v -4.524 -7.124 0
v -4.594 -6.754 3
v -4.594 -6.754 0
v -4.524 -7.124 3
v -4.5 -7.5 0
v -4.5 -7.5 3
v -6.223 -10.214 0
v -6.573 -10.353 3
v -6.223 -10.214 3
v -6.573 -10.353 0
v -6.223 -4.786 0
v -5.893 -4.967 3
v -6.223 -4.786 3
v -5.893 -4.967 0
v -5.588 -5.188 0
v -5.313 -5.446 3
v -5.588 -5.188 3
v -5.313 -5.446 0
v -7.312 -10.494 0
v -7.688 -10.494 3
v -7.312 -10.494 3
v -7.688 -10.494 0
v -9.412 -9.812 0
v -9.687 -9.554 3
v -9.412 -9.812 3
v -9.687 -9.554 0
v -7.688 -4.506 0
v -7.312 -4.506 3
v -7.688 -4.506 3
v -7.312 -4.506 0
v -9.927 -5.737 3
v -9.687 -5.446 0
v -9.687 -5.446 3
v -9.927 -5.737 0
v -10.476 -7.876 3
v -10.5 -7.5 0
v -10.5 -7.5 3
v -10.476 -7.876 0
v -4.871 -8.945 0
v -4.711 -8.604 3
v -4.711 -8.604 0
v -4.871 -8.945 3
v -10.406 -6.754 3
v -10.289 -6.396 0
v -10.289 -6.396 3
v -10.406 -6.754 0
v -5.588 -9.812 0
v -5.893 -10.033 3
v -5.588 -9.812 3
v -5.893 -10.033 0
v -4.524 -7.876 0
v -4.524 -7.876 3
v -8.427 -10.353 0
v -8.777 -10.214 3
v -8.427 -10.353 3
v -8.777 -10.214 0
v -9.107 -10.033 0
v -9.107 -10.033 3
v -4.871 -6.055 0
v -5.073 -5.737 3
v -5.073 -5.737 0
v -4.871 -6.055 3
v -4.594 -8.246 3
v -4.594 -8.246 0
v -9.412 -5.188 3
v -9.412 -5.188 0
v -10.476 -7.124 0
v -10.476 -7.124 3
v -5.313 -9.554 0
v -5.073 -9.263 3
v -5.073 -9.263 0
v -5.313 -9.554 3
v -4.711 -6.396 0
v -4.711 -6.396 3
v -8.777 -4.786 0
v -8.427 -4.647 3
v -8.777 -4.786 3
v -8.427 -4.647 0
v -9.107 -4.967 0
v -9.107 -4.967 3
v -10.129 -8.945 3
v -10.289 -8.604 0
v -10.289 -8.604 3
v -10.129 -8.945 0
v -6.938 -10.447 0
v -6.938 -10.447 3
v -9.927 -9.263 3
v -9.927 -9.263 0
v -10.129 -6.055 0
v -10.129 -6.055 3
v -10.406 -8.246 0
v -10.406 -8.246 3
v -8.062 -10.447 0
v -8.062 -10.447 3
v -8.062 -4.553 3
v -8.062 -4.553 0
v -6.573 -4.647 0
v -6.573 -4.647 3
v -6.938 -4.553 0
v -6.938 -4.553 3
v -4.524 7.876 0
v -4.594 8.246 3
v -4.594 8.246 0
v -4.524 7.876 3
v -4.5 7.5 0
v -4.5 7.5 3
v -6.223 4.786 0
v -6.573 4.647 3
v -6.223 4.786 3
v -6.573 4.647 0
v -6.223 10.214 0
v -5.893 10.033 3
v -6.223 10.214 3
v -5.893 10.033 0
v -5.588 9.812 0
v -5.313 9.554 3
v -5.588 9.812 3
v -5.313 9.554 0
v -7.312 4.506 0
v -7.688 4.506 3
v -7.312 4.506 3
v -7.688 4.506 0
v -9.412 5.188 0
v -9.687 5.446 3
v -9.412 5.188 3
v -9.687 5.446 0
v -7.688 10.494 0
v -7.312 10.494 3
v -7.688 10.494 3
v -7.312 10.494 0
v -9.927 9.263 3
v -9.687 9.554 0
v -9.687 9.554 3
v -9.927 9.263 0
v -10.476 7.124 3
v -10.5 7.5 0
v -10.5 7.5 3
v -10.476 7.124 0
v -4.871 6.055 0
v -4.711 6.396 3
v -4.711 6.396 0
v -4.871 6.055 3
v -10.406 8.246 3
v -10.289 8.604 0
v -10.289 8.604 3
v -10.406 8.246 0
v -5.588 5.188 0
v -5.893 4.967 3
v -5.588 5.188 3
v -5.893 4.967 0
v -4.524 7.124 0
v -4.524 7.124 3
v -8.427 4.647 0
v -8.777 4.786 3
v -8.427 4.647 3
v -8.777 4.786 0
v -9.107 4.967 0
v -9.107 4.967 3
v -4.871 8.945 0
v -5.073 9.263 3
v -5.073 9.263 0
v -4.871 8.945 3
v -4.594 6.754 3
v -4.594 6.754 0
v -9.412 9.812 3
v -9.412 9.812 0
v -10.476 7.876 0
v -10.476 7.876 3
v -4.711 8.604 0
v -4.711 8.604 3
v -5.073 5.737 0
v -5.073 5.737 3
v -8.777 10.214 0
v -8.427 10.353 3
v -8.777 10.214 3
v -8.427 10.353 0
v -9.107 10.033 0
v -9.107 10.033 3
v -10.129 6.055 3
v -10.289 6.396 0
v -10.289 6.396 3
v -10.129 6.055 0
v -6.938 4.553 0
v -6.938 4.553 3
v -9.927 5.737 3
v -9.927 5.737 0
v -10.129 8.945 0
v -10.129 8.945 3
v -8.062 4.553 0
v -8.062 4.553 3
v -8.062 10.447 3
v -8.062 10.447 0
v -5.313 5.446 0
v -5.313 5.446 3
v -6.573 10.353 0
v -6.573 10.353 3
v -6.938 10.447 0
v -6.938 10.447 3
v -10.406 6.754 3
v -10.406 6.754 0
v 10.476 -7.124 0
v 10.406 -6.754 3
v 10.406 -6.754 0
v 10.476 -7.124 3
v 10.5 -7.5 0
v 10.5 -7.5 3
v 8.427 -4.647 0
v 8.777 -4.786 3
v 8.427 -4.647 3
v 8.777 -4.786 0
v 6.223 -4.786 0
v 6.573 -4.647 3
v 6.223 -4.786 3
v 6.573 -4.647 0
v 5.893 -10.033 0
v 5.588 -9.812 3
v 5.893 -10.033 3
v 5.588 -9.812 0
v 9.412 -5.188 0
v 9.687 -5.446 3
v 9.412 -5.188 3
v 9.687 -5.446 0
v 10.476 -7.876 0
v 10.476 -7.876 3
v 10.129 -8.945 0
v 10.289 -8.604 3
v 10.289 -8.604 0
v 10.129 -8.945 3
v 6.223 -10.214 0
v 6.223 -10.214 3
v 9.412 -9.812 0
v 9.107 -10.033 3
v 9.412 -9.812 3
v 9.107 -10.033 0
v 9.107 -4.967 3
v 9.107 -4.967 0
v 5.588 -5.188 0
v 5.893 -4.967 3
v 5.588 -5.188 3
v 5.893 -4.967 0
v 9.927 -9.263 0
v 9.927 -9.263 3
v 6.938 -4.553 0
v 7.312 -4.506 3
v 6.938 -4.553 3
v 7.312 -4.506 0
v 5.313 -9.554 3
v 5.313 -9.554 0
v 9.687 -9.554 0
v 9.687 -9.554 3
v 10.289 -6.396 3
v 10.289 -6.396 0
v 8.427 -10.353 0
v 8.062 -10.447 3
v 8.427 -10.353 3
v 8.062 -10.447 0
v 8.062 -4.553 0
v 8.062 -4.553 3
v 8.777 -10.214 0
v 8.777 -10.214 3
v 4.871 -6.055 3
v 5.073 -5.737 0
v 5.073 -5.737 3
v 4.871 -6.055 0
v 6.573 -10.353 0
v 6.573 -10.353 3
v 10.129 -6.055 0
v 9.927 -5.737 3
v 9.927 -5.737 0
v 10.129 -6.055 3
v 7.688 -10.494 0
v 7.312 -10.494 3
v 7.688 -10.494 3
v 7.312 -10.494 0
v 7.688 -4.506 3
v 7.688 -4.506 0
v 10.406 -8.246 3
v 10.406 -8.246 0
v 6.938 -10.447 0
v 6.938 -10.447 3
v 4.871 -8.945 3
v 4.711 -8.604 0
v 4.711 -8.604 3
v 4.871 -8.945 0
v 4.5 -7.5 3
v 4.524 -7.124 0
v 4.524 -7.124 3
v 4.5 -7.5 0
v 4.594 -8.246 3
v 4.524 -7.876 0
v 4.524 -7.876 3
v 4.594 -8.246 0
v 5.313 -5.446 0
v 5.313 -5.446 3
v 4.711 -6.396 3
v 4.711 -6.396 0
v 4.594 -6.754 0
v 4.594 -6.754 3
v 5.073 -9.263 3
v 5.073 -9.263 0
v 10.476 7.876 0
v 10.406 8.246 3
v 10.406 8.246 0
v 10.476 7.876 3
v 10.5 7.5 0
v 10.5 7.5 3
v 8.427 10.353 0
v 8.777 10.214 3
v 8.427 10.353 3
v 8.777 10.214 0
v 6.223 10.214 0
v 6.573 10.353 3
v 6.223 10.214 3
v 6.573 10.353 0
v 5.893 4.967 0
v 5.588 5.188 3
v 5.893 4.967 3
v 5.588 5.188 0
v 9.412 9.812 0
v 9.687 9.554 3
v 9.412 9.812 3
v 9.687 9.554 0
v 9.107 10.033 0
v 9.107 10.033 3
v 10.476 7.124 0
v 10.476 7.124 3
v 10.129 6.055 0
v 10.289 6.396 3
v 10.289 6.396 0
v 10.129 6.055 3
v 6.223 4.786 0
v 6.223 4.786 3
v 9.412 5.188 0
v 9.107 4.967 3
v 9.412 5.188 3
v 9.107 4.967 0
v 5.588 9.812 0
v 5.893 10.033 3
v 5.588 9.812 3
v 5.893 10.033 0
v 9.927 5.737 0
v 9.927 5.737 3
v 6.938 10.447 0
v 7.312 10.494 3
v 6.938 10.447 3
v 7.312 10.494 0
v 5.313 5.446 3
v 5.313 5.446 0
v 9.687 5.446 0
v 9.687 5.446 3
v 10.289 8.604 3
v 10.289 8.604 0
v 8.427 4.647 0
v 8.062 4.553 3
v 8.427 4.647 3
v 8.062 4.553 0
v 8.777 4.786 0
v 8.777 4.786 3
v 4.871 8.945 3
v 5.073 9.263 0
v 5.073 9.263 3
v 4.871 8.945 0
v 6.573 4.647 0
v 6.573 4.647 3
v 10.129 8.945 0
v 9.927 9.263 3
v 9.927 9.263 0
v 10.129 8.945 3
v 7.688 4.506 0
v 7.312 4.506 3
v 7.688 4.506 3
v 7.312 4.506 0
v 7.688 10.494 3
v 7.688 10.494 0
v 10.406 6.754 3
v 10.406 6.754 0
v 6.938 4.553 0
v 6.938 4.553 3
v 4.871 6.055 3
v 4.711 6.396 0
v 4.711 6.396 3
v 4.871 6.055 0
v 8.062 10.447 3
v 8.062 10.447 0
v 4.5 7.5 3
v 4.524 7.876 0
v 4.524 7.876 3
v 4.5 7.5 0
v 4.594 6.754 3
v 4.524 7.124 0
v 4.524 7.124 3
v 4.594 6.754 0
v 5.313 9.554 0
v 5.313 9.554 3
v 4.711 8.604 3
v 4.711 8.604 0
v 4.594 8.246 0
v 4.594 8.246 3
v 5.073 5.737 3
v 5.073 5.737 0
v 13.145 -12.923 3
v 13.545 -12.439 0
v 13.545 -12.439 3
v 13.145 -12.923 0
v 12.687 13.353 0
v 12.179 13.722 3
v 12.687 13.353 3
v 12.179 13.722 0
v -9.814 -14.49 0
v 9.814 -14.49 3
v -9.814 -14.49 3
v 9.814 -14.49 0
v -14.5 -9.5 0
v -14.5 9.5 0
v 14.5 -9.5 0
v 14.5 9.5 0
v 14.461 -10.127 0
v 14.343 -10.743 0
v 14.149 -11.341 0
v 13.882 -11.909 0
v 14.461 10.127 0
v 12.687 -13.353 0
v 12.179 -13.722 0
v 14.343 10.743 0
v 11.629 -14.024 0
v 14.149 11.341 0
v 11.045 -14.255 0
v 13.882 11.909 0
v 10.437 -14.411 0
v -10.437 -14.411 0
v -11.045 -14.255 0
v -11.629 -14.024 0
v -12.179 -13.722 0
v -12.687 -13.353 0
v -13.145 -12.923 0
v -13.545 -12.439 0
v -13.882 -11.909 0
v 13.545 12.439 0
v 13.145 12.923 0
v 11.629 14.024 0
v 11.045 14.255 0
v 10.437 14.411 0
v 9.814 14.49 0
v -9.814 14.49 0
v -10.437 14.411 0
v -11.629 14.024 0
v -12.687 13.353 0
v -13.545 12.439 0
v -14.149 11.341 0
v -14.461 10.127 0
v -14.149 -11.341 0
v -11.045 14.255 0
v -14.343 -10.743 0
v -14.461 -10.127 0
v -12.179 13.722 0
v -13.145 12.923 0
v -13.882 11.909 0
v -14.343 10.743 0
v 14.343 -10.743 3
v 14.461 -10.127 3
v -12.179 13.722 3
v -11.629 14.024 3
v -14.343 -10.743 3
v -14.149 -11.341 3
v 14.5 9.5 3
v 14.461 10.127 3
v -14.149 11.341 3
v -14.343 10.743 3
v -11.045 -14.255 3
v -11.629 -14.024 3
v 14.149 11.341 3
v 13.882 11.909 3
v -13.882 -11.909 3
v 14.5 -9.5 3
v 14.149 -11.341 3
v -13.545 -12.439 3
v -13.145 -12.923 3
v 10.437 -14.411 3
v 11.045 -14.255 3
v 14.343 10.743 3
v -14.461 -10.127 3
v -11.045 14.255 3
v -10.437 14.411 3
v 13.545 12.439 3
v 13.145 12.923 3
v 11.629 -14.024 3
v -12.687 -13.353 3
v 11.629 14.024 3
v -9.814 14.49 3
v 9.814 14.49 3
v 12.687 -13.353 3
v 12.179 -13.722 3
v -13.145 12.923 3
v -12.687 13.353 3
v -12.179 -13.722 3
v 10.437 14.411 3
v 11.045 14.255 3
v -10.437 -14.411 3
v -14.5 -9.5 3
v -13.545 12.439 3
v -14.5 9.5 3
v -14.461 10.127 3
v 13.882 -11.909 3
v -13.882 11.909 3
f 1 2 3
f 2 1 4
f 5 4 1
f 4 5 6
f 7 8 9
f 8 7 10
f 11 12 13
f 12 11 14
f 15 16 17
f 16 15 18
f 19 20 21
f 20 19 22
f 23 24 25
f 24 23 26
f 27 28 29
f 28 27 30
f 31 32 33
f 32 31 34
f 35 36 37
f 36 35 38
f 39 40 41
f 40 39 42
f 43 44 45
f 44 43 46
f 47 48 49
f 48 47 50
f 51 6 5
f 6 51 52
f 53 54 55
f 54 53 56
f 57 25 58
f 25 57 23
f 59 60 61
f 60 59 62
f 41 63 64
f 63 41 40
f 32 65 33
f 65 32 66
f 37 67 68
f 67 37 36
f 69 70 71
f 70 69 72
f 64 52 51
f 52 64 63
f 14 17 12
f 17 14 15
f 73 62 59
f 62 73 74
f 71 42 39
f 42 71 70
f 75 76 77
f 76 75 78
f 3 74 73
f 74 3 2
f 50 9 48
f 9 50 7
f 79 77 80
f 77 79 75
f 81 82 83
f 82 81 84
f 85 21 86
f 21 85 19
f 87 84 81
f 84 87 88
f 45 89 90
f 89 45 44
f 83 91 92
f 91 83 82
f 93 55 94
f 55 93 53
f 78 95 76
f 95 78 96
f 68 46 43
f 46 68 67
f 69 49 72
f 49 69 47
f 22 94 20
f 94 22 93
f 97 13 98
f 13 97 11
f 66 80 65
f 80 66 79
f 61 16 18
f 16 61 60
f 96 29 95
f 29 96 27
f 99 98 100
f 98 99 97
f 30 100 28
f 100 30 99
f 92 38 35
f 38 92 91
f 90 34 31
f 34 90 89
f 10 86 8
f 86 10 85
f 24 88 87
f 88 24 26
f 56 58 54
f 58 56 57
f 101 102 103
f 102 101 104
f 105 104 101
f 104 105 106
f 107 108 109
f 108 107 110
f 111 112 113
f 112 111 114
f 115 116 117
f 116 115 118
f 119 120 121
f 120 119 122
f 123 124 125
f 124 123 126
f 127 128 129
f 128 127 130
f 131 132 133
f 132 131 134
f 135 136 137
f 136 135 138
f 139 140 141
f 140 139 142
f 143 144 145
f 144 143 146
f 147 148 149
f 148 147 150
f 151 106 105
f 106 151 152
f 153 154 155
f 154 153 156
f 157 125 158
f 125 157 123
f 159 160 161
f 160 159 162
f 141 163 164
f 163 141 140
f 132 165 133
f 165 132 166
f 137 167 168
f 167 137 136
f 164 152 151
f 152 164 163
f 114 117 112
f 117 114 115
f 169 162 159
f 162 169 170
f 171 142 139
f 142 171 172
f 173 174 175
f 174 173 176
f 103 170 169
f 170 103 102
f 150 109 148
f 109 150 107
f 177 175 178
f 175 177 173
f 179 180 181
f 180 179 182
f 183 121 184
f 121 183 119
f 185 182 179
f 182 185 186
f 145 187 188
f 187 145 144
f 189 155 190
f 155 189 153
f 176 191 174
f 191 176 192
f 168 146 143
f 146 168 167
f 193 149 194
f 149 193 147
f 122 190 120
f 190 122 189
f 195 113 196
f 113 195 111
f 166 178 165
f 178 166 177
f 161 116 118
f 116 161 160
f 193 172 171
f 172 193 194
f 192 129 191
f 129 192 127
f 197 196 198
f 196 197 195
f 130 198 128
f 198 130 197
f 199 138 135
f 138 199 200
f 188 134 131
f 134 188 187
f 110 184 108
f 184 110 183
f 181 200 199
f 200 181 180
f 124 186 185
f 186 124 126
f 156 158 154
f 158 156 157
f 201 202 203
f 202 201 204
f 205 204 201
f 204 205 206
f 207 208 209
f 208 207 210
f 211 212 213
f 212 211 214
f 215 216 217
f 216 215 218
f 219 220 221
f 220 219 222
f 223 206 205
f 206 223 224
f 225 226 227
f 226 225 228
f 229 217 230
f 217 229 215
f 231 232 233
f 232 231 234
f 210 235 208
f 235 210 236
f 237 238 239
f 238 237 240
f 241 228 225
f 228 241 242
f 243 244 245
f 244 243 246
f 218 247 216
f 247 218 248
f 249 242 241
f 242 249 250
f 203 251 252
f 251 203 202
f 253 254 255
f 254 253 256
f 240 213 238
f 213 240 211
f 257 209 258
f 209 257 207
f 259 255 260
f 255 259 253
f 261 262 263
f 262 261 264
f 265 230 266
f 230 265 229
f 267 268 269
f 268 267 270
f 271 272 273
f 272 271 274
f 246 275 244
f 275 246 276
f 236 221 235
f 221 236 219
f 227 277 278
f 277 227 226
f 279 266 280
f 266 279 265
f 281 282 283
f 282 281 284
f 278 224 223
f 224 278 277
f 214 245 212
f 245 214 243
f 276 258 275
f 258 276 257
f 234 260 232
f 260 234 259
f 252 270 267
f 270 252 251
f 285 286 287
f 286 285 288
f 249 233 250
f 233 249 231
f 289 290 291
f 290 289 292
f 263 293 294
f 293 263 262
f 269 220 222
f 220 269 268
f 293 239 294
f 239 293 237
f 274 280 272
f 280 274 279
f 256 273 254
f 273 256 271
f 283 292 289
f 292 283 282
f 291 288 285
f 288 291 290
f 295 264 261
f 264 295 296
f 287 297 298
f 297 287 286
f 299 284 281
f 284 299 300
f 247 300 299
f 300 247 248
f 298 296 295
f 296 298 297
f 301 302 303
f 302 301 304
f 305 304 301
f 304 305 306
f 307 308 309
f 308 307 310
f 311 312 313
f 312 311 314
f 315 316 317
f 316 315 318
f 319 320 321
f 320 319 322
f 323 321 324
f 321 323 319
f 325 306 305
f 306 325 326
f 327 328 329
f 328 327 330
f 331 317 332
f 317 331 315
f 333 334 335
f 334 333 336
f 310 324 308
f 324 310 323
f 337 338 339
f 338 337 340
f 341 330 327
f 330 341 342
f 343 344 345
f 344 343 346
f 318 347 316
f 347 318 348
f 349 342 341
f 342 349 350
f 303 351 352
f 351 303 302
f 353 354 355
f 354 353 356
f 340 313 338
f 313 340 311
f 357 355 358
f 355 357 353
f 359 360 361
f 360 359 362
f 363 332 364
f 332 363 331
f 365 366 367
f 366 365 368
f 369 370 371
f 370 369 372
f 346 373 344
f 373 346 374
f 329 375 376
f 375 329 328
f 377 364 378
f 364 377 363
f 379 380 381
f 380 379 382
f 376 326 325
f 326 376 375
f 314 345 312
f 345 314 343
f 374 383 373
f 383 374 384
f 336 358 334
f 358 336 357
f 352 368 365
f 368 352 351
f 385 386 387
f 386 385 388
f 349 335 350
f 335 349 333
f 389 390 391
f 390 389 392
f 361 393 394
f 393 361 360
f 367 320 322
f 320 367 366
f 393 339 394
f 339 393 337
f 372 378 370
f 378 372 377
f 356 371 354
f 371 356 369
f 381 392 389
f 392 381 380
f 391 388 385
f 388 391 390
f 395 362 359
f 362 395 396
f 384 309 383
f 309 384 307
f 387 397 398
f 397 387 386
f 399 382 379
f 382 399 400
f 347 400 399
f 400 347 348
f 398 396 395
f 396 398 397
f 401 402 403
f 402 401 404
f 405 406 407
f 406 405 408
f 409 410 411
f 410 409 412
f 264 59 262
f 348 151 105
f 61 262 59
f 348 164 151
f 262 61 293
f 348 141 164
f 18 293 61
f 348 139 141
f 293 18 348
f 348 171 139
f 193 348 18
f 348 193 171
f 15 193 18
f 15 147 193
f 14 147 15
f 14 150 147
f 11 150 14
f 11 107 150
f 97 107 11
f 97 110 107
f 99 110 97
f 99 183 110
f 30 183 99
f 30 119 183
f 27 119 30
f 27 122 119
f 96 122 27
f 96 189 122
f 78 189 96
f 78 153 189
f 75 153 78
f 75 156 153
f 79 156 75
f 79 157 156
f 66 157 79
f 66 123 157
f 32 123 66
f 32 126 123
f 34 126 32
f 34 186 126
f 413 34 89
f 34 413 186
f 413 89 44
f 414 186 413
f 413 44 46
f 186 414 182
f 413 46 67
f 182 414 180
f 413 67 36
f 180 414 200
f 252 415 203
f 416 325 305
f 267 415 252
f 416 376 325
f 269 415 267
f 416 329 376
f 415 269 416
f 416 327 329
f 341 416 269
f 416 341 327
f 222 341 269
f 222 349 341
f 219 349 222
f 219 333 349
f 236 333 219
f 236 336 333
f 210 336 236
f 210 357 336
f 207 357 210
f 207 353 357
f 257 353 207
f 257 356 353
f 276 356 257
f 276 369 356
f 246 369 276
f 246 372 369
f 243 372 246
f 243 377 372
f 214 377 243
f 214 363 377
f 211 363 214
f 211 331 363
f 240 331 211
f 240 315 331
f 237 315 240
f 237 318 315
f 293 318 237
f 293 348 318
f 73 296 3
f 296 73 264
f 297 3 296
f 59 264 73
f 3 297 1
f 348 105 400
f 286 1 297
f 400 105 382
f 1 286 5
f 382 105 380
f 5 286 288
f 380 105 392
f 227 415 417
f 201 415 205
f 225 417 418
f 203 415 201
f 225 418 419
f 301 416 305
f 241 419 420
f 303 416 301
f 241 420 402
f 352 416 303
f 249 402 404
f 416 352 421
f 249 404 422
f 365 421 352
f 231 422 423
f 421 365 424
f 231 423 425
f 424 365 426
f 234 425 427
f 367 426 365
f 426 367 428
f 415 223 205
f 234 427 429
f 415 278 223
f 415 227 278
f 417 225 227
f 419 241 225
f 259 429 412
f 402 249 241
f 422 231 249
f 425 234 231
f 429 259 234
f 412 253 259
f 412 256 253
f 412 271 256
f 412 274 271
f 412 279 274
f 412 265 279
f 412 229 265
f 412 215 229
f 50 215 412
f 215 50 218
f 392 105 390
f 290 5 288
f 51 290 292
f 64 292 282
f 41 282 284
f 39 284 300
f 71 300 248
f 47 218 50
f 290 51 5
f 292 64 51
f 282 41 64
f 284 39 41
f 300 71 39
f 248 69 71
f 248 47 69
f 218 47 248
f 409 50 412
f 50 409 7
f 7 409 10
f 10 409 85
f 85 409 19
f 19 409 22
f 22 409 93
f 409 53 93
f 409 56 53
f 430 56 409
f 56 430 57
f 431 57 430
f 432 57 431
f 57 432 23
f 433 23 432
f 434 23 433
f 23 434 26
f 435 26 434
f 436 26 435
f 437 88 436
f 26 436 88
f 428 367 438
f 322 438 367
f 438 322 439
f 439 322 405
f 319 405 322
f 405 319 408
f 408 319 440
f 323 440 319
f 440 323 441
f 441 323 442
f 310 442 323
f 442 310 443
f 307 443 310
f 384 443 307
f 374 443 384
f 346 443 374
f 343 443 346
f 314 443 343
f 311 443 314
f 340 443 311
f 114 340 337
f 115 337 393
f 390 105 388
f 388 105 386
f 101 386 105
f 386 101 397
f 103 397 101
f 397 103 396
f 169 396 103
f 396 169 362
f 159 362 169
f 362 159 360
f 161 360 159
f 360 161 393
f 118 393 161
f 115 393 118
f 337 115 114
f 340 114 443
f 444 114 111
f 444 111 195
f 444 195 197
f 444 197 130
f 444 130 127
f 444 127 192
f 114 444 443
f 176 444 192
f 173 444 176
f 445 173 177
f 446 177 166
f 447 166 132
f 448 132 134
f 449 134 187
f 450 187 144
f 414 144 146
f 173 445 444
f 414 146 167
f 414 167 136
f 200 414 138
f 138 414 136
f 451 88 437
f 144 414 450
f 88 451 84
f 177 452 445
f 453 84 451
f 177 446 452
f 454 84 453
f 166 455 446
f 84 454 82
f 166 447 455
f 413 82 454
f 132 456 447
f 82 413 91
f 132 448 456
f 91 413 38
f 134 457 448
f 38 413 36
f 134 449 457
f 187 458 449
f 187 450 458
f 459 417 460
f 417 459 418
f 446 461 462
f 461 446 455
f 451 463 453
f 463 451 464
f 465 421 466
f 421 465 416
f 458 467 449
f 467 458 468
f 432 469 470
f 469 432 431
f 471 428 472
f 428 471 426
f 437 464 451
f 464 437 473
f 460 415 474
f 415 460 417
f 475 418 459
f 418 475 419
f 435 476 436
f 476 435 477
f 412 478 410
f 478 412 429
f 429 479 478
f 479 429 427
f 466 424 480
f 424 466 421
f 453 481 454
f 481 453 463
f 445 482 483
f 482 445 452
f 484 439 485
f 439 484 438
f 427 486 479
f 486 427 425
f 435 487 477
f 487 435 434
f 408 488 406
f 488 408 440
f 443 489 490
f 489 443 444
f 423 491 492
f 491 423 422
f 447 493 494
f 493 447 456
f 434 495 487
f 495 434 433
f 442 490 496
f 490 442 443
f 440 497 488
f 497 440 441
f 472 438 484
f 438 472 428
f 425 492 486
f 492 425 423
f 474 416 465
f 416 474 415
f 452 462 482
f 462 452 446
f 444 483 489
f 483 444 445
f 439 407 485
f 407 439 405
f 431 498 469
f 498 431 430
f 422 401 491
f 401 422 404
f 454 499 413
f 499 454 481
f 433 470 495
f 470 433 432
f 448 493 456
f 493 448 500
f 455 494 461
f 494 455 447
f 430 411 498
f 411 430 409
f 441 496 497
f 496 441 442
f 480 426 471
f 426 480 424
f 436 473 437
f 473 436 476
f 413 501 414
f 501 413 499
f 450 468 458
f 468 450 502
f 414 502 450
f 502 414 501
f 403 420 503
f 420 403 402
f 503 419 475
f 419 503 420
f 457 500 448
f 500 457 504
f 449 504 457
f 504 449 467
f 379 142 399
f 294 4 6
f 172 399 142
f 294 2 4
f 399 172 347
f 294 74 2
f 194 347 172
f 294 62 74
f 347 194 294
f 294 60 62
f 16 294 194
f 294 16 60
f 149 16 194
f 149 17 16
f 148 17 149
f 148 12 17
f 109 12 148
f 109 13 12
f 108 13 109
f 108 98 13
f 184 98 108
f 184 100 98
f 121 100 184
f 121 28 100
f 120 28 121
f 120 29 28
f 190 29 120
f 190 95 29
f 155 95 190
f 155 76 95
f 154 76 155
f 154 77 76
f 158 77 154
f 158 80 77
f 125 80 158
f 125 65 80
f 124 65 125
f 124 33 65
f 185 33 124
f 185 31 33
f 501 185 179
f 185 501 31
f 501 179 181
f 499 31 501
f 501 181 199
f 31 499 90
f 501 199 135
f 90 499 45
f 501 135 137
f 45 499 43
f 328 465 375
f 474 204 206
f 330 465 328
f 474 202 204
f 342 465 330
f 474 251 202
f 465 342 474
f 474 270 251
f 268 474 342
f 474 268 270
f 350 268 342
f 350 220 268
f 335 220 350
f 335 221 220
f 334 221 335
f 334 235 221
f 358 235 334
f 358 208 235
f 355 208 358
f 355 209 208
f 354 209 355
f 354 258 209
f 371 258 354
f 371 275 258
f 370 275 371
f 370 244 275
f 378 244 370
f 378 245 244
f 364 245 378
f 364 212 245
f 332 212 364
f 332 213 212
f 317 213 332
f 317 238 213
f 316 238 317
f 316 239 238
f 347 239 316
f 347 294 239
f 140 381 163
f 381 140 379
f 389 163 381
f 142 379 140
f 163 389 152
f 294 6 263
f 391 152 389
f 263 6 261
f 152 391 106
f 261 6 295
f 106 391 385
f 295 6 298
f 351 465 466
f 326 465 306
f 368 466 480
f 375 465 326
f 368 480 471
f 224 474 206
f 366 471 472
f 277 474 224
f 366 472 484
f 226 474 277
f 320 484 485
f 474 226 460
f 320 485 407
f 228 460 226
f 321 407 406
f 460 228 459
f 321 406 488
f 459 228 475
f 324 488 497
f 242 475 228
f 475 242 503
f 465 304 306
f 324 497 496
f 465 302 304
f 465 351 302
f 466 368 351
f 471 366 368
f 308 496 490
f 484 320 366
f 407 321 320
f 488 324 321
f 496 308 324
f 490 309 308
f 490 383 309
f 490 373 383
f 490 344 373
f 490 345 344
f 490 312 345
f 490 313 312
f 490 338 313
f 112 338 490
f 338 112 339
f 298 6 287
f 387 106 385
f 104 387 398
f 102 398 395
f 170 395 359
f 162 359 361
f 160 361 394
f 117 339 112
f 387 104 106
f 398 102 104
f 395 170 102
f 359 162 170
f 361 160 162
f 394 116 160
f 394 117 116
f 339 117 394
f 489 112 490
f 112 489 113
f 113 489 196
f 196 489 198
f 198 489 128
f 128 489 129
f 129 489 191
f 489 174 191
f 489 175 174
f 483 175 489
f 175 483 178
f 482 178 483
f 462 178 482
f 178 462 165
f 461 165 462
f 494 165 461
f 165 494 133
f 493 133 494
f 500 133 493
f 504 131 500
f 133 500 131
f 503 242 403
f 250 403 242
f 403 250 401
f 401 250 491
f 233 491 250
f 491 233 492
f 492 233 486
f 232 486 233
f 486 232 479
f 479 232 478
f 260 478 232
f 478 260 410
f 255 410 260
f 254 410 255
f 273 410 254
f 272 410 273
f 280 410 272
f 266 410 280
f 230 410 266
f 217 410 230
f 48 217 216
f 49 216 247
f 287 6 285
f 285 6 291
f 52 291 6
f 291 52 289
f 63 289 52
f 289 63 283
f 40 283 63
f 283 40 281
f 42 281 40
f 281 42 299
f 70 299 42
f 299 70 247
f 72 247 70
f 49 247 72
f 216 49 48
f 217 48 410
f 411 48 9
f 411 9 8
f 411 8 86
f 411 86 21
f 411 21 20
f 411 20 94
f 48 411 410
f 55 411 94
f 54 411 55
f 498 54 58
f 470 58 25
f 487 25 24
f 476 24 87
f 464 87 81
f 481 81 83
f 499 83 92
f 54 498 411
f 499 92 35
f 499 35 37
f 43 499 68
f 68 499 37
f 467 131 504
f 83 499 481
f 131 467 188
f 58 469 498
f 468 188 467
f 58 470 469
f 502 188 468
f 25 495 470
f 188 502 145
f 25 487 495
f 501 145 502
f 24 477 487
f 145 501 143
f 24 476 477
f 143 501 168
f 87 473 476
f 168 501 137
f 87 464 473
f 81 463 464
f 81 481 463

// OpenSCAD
// Generated by SolidPython 1.1.3 on 2023-03-12 21:51:15
$fn = 50;


difference() {
	union() {
		translate(v = [0, 0, 0]) {
			rotate(a = [0, 0, 0]) {
				hull() {
					translate(v = [-9.5000000000, 9.5000000000, 0]) {
						rotate(a = [0, 0, 0]) {
							translate(v = [0, 0, 0]) {
								rotate(a = [0, 0, 0]) {
									cylinder(h = 3, r = 5);
								}
							}
						}
					}
					translate(v = [9.5000000000, 9.5000000000, 0]) {
						rotate(a = [0, 0, 0]) {
							translate(v = [0, 0, 0]) {
								rotate(a = [0, 0, 0]) {
									cylinder(h = 3, r = 5);
								}
							}
						}
					}
					translate(v = [-9.5000000000, -9.5000000000, 0]) {
						rotate(a = [0, 0, 0]) {
							translate(v = [0, 0, 0]) {
								rotate(a = [0, 0, 0]) {
									cylinder(h = 3, r = 5);
								}
							}
						}
					}
					translate(v = [9.5000000000, -9.5000000000, 0]) {
						rotate(a = [0, 0, 0]) {
							translate(v = [0, 0, 0]) {
								rotate(a = [0, 0, 0]) {
									cylinder(h = 3, r = 5);
								}
							}
						}
					}
				}
			}
		}
	}
	union() {
		translate(v = [-7.5000000000, -7.5000000000, 0]) {
			rotate(a = [0, 0, 0]) {
				translate(v = [0, 0, -50]) {
					rotate(a = [0, 0, 0]) {
						cylinder(h = 100, r = 3.0000000000);
					}
				}
			}
		}
		translate(v = [-7.5000000000, 7.5000000000, 0]) {
			rotate(a = [0, 0, 0]) {
				translate(v = [0, 0, -50]) {
					rotate(a = [0, 0, 0]) {
						cylinder(h = 100, r = 3.0000000000);
					}
				}
			}
		}
		translate(v = [7.5000000000, -7.5000000000, 0]) {
			rotate(a = [0, 0, 0]) {
				translate(v = [0, 0, -50]) {
					rotate(a = [0, 0, 0]) {
						cylinder(h = 100, r = 3.0000000000);
					}
				}
			}
		}
		translate(v = [7.5000000000, 7.5000000000, 0]) {
			rotate(a = [0, 0, 0]) {
				translate(v = [0, 0, -50]) {
					rotate(a = [0, 0, 0]) {
						cylinder(h = 100, r = 3.0000000000);
					}
				}
			}
		}
	}
}
/***********************************************
*********      SolidPython code:      **********
************************************************
 
from solid import *
import os
import subprocess

import oomB

import opsc_library_gen

mode = "laser"
#mode = "3d_print"

defined_objects = {}

radius_dict = {}
countersunk_dict = {}


def set_mode(m):
    global mode
    mode = m
    radius_dict['M6'] = 6.5/2
    radius_dict['M3'] = 3.3/2
    if mode == "laser":
        radius_dict['M6'] = 6/2
        radius_dict['M3'] = 3/2

    countersunk_dict['M3'] = {}
    countersunk_dict['M3']['little_rad'] = radius_dict['M3']
    countersunk_dict['M3']['big_rad'] = (5.5+0.6)/2
    if mode == "laser":
        countersunk_dict['M3']['big_rad'] = (4.75+0.6)/2
        countersunk_dict['M3']['little_rad'] = (4.75+0.6)/2

    countersunk_dict['M3']['height'] = 1.7


def opsc_make_object(filename, objects, save_type="none",resolution=50, layers = 1, tilediff = 200, mode="laser", overwrite=True):
    if overwrite or not os.path.exists(filename):
        set_mode(mode)
        save_type = save_type.lower()
        os.makedirs(os.path.dirname(filename), exist_ok=True)
        final_object = opsc_get_object(objects, mode = mode)
        # Save the final object to the specified filename    
        scad_render_to_file(final_object, filename, file_header='$fn = %s;' % resolution, include_orig_code=True)
        if mode == "laser":
            filename_laser = filename.replace(".scad","-flat.scad")
            scad_render_to_file(getLaser(final_object, layers=layers, tilediff=tilediff), filename_laser, file_header='$fn = %s;' % resolution, include_orig_code=True)
            if save_type == "all":
                saveToAll(filename_laser)
            elif save_type == "dxf":
                saveToDxf(filename_laser)
        if save_type == "all":
            saveToAll(filename)
        elif save_type == "dxf":
            saveToDxf(filename)


def opsc_get_object(objects, mode = "laser"):
    # Create the solidpython objects only include the positive objects and if they don't have inclusion or their inclusion is either all or mode
    # Initialize an empty list to store the results
    positive_objects = []

    # Iterate over the "objects" list
    for obj in objects:
        # Check if the current object has a "type" key with a value of "positive"
        if obj['type'] == 'positive':
            # Check if the current object has an "inclusion" key and its value matches "mode",
            # or if the current object does not have an "inclusion" key at all
            if not 'inclusion' in obj or obj['inclusion'] == "all" or obj['inclusion'] == mode:
                # Call the "get_opsc_item" function with the current object as an argument
                opsc_item = get_opsc_item(obj)
                # Add the result to the "positive_objects" list
                positive_objects.append(opsc_item)
# Initialize an empty list to store the results
    negative_objects = []

    # Iterate over the "objects" list
    for obj in objects:
        # Check if the current object has a "type" key with a value of "negative"
        if obj['type'] == 'negative':
            # Check if the current object has an "inclusion" key and its value matches "mode",
            # or if the current object does not have an "inclusion" key at all
            if not 'inclusion' in obj or obj['inclusion'] == "all" or obj['inclusion'] == mode:
                # Call the "get_opsc_item" function with the current object as an argument
                opsc_item = get_opsc_item(obj)
                # Add the result to the "negative_objects" list
                negative_objects.append(opsc_item)
    
    #positive_objects = [get_opsc_item(obj) for obj in objects if obj['type'] == 'positive']
    #negative_objects = [get_opsc_item(obj) for obj in objects if obj['type'] == 'negative']
    # Union the positive objects
    positive_object = union()(*positive_objects)
    # Union the negative objects
    negative_object = union()(*negative_objects)
    # Create the final object by subtracting the negative objects from the positive objects
    return difference()(positive_object, negative_object)

def get_opsc_item(params):
    # A dictionary to map radius string values to numerical values
    #radius_dict = {'small': 5, 'medium': 10, 'large': 15}
    # An array of function names for basic shapes
    basic_shapes = ['cube', 'sphere', 'cylinder']
    
    # An array of function names for other shapes
    other_shapes = ['hole', 'slot', 'rounded_rectangle', 'countersunk']
    


    # Convert radius to r if present, and remove radius from the params dictionary
    if 'radius' in params:
        if isinstance(params['radius'], str):
            # Use the radius_dict to map the radius string value to a numerical value
            params['r'] = radius_dict[params['radius']]
        else:
            params['r'] = params['radius']
        del params['radius']
    

    # Check if the object type is a basic shape
    if params['shape'] in basic_shapes:
        # Remove shape and unexpected dictionary values
        allowed_keys = {'size', 'r', 'r1', 'r2', 'd', 'h', 'rw', 'rh', 'dw', 'dh'}
        shape_params = {k: v for k, v in params.items() if k in allowed_keys}

        # Call the corresponding function for the shape parameter, using ** notation to pass the shape_params dictionary as keyword arguments
        return get_opsc_transform(params,globals()[params['shape']](**shape_params))
    
    # If the object type is not a basic shape, check if it's a defined object or one of the other shapes
    elif params['shape'] in other_shapes:
        # Call the corresponding function for the shape parameter, passing the params dictionary as an argument
        p2 = copy.deepcopy(params)
        p2["pos"] = [0,0,0]
        return get_opsc_transform(params,globals()[params['shape']](p2))
    
    # If the object is not a basic shape or a defined object, try to import it from a .scad file
    else:
        obj = defined_objects[params['shape']]
        return get_opsc_transform(params,obj)

def get_opsc_transform(params, solid_obj):
    # Rotate the object based on the 'rot' field in the params dictionary, or the 'rotX', 'rotY', and 'rotZ' fields if 'rot' is not present
    rot = params.get('rot', [])
    if rot:
        rotX, rotY, rotZ = rot
    else:
        rotX = params.get('rotX', 0)
        rotY = params.get('rotY', 0)
        rotZ = params.get('rotZ', 0)
    solid_obj = rotate([rotX, rotY, rotZ])(solid_obj)

    # Translate the object based on the 'pos' field in the params dictionary, or the 'x', 'y', and 'z' fields if 'pos' is not present
    pos = params.get('pos', [])
    if pos:
        x, y, z = pos
    else:
        x = params.get('x', 0)
        y = params.get('y', 0)
        z = params.get('z', 0)
    solid_obj = translate([x, y, z])(solid_obj)
    return solid_obj


import random

def opsc_easy_array(type, shape, repeats, pos_start, shift_arr, **kwargs):
    for i in range(0,3):
        repeats.append(1)
        pos_start.append(0)
        shift_arr.append(0)
    return_objects = []

    for x in range(0,repeats[0]):
        for y in range(0,repeats[1]):
            for z in range(0,repeats[2]):
                return_objects.append(opsc_easy(type, shape, pos=[pos_start[0]+x*shift_arr[0],pos_start[1]+y*shift_arr[1],pos_start[2]+z*shift_arr[2]], **kwargs))
    return return_objects                



def opsc_easy(type, shape, **kwargs):
    obj = {
        'type': type,
        'shape': shape
    }
    for param in ['size', 'r', 'r1', 'r2', 'd', 'h', 'rw', 'rh', 'dw', 'dh', 'pos', 'x', 'y', 'z', 'rot', 'rotX', 'rotY', 'rotZ', "w", "inclusion"]:
        if param in kwargs:
            obj[param] = kwargs[param]
    return obj

def hole(params):
    p2 = copy.deepcopy(params)  
    # Check if the radius is a string and replace it with the corresponding value from the dictionary
    if isinstance(p2['r'], str):
        p2['r'] = radius_dict[p2['r']]
    
    # Set the height to 100 if not specified
    if 'h' not in p2:
        p2['h'] = 100
        p2["pos"] = [0,0,-50]
    p2["center"] = True
    # Create the cylinder object
    p2["shape"] = "cylinder"
    p2["type"] = "positive"

    return get_opsc_item(p2)

import copy

def countersunk(params):
    p2 = copy.deepcopy(params)
    counter_rad = p2['r']
    p2['r'] = radius_dict[p2['r']]
    hp = copy.deepcopy(p2)
    hp["type"] = "positive"
    hp["shape"] = "hole"
    del hp["rot"]
    hol = get_opsc_item(hp)
    
    cp = copy.deepcopy(p2)
    cp["h"] = countersunk_dict[counter_rad]["height"]
    cp["r2"] = countersunk_dict[counter_rad]["little_rad"]
    cp["r1"] = countersunk_dict[counter_rad]["big_rad"]
    del cp["r"]
    del cp["rot"]
    cp["type"] = "positive"
    cp["shape"] = "cylinder"
    cp["pos"] = [0,0,0]

    top = get_opsc_item(cp)
    return union()(hol,top)



def slot(params):  
    p2 = copy.deepcopy(params) 
    if isinstance(p2['r'], str):
        p2['r'] = radius_dict[p2['r']]
    p2["type"] = "positive"
    p2["shape"] = "hole"
    del p2["rot"]
    p2["pos"] = [0,0,0]
    left = copy.deepcopy(p2)
    right = copy.deepcopy(p2)
    left["pos"][0] = p2["w"] / 2 - p2["r"] 
    
    right["pos"][0] = -p2["w"] / 2 + p2["r"] 
    pass
    leftObj = get_opsc_item(left)
    rightObj = get_opsc_item(right)
    return hull()(leftObj, rightObj)

def rounded_rectangle(params):   
    p2 = copy.deepcopy(params) 
    p2["h"] = p2["size"][2]
    p2["pos"] = p2.get("pos", [0, 0, 0]) 
    p2["type"] = "positive"
    p2["shape"] = "hole"
    p2["pos"] = [0,0,0]
    
    if 'rot' in p2:
        del p2["rot"]   
    if 'r' not in p2:
        p2["r"] = 5 
    tl = copy.deepcopy(p2)
    tr = copy.deepcopy(p2)
    bl = copy.deepcopy(p2)
    br = copy.deepcopy(p2)
    tl["pos"][0] = -(p2["size"][0] - p2["r"]*2)/2
    tl["pos"][1] = (p2["size"][1] - p2["r"]*2)/2
    tr["pos"][0] = (p2["size"][0] - p2["r"]*2)/2
    tr["pos"][1] = (p2["size"][1] - p2["r"]*2)/2
    bl["pos"][0] = -(p2["size"][0] - p2["r"]*2)/2
    bl["pos"][1] = -(p2["size"][1] - p2["r"]*2)/2
    br["pos"][0] = (p2["size"][0] - p2["r"]*2)/2
    br["pos"][1] = -(p2["size"][1] - p2["r"]*2)/2
    del tl["size"]
    del tr["size"]
    del bl["size"]
    del br["size"]
    tlo = get_opsc_item(tl)
    tro = get_opsc_item(tr)
    blo = get_opsc_item(bl)
    bro = get_opsc_item(br)    
    return hull()(tlo, tro, blo, bro)



def import_scad_object(filename):
    # Import the .scad file and convert it to a solidpython object
    #filename = "parts"
    obj = import_scad(filename)
    return obj.main()
    


import os
import solid as solidpython

# A dictionary to store the defined objects


def load_scad_objects():
    opsc_library_gen.gen_library(defined_objects)

import random

def test(num_objects):
    objects = []
    for i in range(num_objects):
        # Choose a random shape
        #shape = random.choice(['cube', 'sphere', 'cylinder', 'hole', 'slot', "rounded_rectangle"])
        shape = random.choice(["rounded_rectangle"])

        # Choose a random type
        type = random.choice(['positive', 'negative'])
        
        # Create an empty object dictionary
        obj = {'shape': shape, 'type': type}
        
        # Set shape-specific parameters
        if obj['shape'] in ['cube']:
            obj['size'] =  [random.uniform(5, 15), random.uniform(5, 15), random.uniform(5, 15)]
        if obj['shape'] in ['rounded_rectangle']:
            obj['size'] =  [random.uniform(5, 15), random.uniform(5, 15), random.uniform(5, 15)]
            obj['r'] = random.uniform(0.5, 5)
        elif obj['shape'] == 'sphere':
            obj['r'] = random.uniform(5, 15)
        elif obj['shape'] in ['cylinder', 'hole']:
            obj['r'] = random.uniform(0.5, 5)
            obj['h'] = random.uniform(5, 15)
        elif obj['shape'] == 'slot':
            obj['r'] = random.uniform(0.5, 5)
            obj['h'] = random.uniform(5, 15)
            obj['w'] = random.uniform(5, 15)
        
        # Set a random position and rotation
        obj['pos'] = [random.uniform(-20, 20), random.uniform(-20, 20), random.uniform(-20, 20)]
        obj['rot'] = [random.uniform(-180, 180), random.uniform(-180, 180), random.uniform(-180, 180)]
        
        # Add the object to the list
        objects.append(obj)
    return objects

####### old file saving
def saveToAll(fileIn):
    saveToDxf(fileIn)
    saveToPng(fileIn)
    saveToStl(fileIn)
    saveToSvg(fileIn)

def saveToDxf(fileIn, fileOut="", copy_to_laser=True):
    if fileOut == "":
        fileOut = fileIn.replace(".scad",".dxf")
    saveToFile(fileIn, fileOut)


    
def saveToPng(fileIn, fileOut="",extra="--render"):
    if fileOut == "":
        fileOut = fileIn.replace(".scad",".png")
    saveToFile(fileIn, fileOut)

def saveToStl(fileIn, fileOut=""):
    if fileOut == "":
        fileOut = fileIn.replace(".scad",".stl")
    saveToFile(fileIn, fileOut)
    
def saveToSvg(fileIn, fileOut=""):
    if fileOut == "":
        fileOut = fileIn.replace(".scad",".svg")
    saveToFile(fileIn, fileOut)

def saveToFile(fileIn, fileOut,extra=""):
    #extra = extra + " --colorscheme Tomorrow"

    launchStr = 'openscad -o "' + fileOut + '"' + extra + ' "' + fileIn + '"'
    if ".png" in fileOut:
        launchStr = launchStr + " --render"
    print("            saveToFile launch string: " + launchStr)
    subprocess.run(launchStr)
    x=0

def getLaser(final_object,start=1.5,layers=1,thickness=3,tilediff=200):
        rv= []

        for x in range(layers):
            rv.append(translate([0,x*tilediff,0])(
                    projection()(
                        intersection()(translate([-500,-500,start+x*thickness])(cube(size=[1000,1000,0.1])),
                            final_object
                        )
                    )
            )
            )
            
        return union()(rv)

set_mode("laser")
load_scad_objects() 
 
************************************************/
